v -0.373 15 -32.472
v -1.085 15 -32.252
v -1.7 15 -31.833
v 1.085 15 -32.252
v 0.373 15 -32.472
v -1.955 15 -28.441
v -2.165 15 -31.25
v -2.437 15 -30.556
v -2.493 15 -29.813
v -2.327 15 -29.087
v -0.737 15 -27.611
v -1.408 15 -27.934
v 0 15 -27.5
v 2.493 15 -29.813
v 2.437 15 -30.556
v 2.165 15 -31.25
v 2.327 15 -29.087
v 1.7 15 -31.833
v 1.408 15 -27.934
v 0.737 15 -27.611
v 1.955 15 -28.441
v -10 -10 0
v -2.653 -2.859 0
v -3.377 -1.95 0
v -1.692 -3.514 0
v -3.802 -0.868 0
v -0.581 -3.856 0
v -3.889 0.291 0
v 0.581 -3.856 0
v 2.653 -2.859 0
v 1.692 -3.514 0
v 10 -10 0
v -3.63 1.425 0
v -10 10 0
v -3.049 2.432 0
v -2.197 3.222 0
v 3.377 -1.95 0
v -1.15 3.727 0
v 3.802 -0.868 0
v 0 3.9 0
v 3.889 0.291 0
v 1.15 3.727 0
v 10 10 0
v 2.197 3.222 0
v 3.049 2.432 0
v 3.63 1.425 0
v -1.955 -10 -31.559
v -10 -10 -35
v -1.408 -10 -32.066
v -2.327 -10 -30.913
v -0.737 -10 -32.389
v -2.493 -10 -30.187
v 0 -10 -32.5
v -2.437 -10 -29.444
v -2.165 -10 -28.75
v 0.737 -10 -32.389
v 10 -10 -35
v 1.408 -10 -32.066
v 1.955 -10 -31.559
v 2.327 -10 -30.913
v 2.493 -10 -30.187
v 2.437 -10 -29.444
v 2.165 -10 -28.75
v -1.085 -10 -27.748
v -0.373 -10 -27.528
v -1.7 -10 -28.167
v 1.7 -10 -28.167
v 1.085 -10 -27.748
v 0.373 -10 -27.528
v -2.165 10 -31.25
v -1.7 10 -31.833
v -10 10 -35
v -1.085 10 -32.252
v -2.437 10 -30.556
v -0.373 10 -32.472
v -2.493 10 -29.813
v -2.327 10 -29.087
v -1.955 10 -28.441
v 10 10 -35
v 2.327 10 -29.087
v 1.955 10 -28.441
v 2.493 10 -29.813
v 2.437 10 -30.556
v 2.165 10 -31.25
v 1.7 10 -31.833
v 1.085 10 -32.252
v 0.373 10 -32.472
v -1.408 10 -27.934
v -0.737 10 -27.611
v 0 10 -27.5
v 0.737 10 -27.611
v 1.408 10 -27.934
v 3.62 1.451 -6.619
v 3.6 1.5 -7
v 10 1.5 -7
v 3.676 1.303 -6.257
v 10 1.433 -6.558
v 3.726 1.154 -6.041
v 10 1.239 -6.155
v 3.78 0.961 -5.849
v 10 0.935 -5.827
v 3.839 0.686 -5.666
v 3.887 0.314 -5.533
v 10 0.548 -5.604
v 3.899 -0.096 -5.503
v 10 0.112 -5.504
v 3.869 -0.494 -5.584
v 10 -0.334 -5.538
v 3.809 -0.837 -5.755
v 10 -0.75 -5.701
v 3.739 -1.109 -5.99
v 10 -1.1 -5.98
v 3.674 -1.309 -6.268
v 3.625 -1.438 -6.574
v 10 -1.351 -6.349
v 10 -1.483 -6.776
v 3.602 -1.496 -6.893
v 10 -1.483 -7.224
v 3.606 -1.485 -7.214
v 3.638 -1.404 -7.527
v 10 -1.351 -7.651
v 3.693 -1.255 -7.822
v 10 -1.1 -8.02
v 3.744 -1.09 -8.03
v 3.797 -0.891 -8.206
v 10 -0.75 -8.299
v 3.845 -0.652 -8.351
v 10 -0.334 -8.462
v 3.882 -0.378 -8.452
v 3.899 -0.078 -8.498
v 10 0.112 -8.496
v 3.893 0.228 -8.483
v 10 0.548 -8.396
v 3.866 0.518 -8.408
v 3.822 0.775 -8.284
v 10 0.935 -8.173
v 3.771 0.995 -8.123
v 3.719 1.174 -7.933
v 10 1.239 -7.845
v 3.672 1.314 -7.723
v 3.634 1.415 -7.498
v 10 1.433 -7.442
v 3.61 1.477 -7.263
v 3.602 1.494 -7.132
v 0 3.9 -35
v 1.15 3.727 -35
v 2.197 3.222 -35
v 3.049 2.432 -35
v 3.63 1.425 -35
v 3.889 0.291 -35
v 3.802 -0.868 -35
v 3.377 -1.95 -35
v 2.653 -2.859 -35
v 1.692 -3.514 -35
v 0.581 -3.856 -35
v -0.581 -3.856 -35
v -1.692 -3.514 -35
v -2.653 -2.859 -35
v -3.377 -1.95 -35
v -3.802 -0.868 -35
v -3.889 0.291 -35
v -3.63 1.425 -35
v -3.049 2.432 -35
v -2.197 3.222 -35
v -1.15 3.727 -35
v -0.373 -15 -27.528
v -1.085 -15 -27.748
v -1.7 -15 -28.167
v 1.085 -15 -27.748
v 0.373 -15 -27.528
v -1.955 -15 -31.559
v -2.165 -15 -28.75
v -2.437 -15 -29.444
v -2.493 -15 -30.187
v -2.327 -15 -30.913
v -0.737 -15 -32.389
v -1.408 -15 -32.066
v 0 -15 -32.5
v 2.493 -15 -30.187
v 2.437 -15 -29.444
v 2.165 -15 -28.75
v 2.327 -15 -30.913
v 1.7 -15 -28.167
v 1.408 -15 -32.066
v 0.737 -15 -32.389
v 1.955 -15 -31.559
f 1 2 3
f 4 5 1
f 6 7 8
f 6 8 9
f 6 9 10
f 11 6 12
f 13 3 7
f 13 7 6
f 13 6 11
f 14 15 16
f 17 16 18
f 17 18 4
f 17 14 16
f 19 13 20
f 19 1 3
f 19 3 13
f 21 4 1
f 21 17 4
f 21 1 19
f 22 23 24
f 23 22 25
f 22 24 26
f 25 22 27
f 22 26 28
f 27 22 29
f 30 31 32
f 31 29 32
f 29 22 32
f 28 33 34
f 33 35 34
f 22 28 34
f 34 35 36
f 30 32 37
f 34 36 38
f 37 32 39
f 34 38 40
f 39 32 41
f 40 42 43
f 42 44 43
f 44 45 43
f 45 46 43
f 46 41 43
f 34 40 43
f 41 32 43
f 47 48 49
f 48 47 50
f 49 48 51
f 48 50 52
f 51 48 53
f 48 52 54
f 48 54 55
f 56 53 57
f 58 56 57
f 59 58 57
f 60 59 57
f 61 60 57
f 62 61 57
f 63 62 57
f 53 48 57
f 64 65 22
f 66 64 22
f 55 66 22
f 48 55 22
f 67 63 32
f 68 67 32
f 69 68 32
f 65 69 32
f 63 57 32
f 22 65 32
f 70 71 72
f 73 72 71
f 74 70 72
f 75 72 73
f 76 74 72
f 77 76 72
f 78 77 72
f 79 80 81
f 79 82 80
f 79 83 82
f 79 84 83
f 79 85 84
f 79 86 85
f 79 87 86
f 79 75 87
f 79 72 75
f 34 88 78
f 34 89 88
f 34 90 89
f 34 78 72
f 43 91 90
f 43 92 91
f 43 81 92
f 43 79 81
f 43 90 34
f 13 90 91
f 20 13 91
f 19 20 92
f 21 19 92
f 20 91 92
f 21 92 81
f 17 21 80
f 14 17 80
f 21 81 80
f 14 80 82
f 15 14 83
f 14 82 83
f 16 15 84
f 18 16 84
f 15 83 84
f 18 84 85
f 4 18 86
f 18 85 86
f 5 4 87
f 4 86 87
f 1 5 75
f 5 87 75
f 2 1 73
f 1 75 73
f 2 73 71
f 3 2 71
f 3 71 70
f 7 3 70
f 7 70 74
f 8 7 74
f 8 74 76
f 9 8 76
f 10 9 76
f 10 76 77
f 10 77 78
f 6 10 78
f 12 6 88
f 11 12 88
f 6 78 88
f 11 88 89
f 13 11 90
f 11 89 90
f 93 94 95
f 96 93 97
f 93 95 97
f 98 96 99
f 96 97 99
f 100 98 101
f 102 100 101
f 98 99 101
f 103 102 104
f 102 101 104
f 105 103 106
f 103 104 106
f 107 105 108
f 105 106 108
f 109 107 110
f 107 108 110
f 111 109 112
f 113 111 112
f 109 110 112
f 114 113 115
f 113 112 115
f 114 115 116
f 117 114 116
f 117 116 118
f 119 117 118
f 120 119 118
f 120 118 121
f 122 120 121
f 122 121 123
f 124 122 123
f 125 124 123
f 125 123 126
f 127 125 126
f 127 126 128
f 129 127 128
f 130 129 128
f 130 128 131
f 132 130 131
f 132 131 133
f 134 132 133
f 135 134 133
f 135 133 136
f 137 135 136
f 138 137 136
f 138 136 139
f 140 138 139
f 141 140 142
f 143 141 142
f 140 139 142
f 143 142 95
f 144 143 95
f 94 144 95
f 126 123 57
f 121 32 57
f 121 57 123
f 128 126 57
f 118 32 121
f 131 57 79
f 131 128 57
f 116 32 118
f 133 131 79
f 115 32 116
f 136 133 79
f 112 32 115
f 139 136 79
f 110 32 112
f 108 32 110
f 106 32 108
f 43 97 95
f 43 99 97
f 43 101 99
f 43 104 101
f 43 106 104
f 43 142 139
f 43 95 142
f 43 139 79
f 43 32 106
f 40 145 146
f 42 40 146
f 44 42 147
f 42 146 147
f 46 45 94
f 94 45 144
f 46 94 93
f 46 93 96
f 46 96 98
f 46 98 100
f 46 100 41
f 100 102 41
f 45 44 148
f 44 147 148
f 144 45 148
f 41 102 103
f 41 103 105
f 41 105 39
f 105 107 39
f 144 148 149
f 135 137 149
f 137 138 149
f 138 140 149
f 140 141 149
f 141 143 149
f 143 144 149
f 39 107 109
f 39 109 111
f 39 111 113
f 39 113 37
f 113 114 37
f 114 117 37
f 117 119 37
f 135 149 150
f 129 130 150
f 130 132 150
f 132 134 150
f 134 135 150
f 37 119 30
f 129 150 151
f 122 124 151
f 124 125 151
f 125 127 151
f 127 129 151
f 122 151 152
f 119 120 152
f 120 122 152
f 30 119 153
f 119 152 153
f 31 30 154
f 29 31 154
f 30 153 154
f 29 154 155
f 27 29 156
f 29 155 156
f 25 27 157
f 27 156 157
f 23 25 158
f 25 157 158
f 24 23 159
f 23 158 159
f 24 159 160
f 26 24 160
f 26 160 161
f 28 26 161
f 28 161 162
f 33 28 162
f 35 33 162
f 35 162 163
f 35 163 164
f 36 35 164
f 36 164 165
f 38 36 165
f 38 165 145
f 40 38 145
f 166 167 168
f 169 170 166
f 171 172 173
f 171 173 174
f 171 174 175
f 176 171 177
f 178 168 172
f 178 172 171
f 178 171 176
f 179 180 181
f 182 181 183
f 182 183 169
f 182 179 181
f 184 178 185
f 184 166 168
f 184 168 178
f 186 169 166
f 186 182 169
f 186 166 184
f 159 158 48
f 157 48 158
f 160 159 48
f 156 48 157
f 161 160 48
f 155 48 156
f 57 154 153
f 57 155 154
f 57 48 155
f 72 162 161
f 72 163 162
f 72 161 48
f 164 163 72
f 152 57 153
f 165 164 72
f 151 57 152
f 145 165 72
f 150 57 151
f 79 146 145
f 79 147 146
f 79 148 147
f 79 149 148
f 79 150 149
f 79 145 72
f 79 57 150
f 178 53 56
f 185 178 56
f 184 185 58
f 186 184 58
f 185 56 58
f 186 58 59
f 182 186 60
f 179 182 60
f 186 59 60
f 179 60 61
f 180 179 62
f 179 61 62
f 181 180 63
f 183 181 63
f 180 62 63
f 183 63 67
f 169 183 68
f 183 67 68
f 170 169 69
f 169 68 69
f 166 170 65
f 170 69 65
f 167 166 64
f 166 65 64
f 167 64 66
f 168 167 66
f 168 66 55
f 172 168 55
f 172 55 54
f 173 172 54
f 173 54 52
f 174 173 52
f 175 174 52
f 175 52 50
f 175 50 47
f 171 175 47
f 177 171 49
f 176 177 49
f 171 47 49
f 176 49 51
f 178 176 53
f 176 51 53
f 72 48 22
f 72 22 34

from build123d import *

# Parameters (mm, degrees)
SKETCH106_W     = 20
SKETCH106_H     = 35
PAD054_DEPTH    = 10
PAD055_DEPTH    = 10
SKETCH107_R     = 3.9
POCKET042_DEPTH = 35
SKETCH108_R     = 1.5
POCKET043_DEPTH = 10
SKETCH109_R     = 2.5
PAD056_DEPTH    = 5
SKETCH110_R     = 2.5
PAD057_DEPTH    = 5


with BuildPart() as part:
    # Sketch106 → Pad054 (new body, symmetric)
    with BuildSketch(Plane.YZ):
        with Locations((0, -17.5)):
            Rectangle(SKETCH106_W, SKETCH106_H)
    extrude(amount=PAD054_DEPTH, both=True)

    # Sketch106 → Pad055 (join)
    with BuildSketch(Plane.YZ):
        with Locations((0, -17.5)):
            Rectangle(SKETCH106_W, SKETCH106_H)
    extrude(amount=PAD055_DEPTH)

    # Sketch107 (on Face1 of Pad055) → Pocket042 (cut)
    with BuildSketch(Plane.YX.offset(35)):
        Circle(SKETCH107_R)
    extrude(amount=-POCKET042_DEPTH, mode=Mode.SUBTRACT)

    # Sketch108 (on Face9 of Pocket042) → Pocket043 (cut)
    with BuildSketch(Plane.YZ.offset(10)):
        with Locations((0, -7)):
            Circle(SKETCH108_R)
    extrude(amount=-POCKET043_DEPTH, mode=Mode.SUBTRACT)

    # Sketch109 (on Face8 of Pocket043) → Pad056 (join)
    with BuildSketch(Plane.ZX.offset(10)):
        with Locations((-30, 0)):
            Circle(SKETCH109_R)
    extrude(amount=PAD056_DEPTH)

    # Sketch110 (on Face11 of Pad056) → Pad057 (join)
    with BuildSketch(Plane(origin=(0, -10, 0), x_dir=(0, 0, -1), z_dir=(0, -1, 0))):
        with Locations((30, 0)):
            Circle(SKETCH110_R)
    extrude(amount=PAD057_DEPTH)


solid = part.part
